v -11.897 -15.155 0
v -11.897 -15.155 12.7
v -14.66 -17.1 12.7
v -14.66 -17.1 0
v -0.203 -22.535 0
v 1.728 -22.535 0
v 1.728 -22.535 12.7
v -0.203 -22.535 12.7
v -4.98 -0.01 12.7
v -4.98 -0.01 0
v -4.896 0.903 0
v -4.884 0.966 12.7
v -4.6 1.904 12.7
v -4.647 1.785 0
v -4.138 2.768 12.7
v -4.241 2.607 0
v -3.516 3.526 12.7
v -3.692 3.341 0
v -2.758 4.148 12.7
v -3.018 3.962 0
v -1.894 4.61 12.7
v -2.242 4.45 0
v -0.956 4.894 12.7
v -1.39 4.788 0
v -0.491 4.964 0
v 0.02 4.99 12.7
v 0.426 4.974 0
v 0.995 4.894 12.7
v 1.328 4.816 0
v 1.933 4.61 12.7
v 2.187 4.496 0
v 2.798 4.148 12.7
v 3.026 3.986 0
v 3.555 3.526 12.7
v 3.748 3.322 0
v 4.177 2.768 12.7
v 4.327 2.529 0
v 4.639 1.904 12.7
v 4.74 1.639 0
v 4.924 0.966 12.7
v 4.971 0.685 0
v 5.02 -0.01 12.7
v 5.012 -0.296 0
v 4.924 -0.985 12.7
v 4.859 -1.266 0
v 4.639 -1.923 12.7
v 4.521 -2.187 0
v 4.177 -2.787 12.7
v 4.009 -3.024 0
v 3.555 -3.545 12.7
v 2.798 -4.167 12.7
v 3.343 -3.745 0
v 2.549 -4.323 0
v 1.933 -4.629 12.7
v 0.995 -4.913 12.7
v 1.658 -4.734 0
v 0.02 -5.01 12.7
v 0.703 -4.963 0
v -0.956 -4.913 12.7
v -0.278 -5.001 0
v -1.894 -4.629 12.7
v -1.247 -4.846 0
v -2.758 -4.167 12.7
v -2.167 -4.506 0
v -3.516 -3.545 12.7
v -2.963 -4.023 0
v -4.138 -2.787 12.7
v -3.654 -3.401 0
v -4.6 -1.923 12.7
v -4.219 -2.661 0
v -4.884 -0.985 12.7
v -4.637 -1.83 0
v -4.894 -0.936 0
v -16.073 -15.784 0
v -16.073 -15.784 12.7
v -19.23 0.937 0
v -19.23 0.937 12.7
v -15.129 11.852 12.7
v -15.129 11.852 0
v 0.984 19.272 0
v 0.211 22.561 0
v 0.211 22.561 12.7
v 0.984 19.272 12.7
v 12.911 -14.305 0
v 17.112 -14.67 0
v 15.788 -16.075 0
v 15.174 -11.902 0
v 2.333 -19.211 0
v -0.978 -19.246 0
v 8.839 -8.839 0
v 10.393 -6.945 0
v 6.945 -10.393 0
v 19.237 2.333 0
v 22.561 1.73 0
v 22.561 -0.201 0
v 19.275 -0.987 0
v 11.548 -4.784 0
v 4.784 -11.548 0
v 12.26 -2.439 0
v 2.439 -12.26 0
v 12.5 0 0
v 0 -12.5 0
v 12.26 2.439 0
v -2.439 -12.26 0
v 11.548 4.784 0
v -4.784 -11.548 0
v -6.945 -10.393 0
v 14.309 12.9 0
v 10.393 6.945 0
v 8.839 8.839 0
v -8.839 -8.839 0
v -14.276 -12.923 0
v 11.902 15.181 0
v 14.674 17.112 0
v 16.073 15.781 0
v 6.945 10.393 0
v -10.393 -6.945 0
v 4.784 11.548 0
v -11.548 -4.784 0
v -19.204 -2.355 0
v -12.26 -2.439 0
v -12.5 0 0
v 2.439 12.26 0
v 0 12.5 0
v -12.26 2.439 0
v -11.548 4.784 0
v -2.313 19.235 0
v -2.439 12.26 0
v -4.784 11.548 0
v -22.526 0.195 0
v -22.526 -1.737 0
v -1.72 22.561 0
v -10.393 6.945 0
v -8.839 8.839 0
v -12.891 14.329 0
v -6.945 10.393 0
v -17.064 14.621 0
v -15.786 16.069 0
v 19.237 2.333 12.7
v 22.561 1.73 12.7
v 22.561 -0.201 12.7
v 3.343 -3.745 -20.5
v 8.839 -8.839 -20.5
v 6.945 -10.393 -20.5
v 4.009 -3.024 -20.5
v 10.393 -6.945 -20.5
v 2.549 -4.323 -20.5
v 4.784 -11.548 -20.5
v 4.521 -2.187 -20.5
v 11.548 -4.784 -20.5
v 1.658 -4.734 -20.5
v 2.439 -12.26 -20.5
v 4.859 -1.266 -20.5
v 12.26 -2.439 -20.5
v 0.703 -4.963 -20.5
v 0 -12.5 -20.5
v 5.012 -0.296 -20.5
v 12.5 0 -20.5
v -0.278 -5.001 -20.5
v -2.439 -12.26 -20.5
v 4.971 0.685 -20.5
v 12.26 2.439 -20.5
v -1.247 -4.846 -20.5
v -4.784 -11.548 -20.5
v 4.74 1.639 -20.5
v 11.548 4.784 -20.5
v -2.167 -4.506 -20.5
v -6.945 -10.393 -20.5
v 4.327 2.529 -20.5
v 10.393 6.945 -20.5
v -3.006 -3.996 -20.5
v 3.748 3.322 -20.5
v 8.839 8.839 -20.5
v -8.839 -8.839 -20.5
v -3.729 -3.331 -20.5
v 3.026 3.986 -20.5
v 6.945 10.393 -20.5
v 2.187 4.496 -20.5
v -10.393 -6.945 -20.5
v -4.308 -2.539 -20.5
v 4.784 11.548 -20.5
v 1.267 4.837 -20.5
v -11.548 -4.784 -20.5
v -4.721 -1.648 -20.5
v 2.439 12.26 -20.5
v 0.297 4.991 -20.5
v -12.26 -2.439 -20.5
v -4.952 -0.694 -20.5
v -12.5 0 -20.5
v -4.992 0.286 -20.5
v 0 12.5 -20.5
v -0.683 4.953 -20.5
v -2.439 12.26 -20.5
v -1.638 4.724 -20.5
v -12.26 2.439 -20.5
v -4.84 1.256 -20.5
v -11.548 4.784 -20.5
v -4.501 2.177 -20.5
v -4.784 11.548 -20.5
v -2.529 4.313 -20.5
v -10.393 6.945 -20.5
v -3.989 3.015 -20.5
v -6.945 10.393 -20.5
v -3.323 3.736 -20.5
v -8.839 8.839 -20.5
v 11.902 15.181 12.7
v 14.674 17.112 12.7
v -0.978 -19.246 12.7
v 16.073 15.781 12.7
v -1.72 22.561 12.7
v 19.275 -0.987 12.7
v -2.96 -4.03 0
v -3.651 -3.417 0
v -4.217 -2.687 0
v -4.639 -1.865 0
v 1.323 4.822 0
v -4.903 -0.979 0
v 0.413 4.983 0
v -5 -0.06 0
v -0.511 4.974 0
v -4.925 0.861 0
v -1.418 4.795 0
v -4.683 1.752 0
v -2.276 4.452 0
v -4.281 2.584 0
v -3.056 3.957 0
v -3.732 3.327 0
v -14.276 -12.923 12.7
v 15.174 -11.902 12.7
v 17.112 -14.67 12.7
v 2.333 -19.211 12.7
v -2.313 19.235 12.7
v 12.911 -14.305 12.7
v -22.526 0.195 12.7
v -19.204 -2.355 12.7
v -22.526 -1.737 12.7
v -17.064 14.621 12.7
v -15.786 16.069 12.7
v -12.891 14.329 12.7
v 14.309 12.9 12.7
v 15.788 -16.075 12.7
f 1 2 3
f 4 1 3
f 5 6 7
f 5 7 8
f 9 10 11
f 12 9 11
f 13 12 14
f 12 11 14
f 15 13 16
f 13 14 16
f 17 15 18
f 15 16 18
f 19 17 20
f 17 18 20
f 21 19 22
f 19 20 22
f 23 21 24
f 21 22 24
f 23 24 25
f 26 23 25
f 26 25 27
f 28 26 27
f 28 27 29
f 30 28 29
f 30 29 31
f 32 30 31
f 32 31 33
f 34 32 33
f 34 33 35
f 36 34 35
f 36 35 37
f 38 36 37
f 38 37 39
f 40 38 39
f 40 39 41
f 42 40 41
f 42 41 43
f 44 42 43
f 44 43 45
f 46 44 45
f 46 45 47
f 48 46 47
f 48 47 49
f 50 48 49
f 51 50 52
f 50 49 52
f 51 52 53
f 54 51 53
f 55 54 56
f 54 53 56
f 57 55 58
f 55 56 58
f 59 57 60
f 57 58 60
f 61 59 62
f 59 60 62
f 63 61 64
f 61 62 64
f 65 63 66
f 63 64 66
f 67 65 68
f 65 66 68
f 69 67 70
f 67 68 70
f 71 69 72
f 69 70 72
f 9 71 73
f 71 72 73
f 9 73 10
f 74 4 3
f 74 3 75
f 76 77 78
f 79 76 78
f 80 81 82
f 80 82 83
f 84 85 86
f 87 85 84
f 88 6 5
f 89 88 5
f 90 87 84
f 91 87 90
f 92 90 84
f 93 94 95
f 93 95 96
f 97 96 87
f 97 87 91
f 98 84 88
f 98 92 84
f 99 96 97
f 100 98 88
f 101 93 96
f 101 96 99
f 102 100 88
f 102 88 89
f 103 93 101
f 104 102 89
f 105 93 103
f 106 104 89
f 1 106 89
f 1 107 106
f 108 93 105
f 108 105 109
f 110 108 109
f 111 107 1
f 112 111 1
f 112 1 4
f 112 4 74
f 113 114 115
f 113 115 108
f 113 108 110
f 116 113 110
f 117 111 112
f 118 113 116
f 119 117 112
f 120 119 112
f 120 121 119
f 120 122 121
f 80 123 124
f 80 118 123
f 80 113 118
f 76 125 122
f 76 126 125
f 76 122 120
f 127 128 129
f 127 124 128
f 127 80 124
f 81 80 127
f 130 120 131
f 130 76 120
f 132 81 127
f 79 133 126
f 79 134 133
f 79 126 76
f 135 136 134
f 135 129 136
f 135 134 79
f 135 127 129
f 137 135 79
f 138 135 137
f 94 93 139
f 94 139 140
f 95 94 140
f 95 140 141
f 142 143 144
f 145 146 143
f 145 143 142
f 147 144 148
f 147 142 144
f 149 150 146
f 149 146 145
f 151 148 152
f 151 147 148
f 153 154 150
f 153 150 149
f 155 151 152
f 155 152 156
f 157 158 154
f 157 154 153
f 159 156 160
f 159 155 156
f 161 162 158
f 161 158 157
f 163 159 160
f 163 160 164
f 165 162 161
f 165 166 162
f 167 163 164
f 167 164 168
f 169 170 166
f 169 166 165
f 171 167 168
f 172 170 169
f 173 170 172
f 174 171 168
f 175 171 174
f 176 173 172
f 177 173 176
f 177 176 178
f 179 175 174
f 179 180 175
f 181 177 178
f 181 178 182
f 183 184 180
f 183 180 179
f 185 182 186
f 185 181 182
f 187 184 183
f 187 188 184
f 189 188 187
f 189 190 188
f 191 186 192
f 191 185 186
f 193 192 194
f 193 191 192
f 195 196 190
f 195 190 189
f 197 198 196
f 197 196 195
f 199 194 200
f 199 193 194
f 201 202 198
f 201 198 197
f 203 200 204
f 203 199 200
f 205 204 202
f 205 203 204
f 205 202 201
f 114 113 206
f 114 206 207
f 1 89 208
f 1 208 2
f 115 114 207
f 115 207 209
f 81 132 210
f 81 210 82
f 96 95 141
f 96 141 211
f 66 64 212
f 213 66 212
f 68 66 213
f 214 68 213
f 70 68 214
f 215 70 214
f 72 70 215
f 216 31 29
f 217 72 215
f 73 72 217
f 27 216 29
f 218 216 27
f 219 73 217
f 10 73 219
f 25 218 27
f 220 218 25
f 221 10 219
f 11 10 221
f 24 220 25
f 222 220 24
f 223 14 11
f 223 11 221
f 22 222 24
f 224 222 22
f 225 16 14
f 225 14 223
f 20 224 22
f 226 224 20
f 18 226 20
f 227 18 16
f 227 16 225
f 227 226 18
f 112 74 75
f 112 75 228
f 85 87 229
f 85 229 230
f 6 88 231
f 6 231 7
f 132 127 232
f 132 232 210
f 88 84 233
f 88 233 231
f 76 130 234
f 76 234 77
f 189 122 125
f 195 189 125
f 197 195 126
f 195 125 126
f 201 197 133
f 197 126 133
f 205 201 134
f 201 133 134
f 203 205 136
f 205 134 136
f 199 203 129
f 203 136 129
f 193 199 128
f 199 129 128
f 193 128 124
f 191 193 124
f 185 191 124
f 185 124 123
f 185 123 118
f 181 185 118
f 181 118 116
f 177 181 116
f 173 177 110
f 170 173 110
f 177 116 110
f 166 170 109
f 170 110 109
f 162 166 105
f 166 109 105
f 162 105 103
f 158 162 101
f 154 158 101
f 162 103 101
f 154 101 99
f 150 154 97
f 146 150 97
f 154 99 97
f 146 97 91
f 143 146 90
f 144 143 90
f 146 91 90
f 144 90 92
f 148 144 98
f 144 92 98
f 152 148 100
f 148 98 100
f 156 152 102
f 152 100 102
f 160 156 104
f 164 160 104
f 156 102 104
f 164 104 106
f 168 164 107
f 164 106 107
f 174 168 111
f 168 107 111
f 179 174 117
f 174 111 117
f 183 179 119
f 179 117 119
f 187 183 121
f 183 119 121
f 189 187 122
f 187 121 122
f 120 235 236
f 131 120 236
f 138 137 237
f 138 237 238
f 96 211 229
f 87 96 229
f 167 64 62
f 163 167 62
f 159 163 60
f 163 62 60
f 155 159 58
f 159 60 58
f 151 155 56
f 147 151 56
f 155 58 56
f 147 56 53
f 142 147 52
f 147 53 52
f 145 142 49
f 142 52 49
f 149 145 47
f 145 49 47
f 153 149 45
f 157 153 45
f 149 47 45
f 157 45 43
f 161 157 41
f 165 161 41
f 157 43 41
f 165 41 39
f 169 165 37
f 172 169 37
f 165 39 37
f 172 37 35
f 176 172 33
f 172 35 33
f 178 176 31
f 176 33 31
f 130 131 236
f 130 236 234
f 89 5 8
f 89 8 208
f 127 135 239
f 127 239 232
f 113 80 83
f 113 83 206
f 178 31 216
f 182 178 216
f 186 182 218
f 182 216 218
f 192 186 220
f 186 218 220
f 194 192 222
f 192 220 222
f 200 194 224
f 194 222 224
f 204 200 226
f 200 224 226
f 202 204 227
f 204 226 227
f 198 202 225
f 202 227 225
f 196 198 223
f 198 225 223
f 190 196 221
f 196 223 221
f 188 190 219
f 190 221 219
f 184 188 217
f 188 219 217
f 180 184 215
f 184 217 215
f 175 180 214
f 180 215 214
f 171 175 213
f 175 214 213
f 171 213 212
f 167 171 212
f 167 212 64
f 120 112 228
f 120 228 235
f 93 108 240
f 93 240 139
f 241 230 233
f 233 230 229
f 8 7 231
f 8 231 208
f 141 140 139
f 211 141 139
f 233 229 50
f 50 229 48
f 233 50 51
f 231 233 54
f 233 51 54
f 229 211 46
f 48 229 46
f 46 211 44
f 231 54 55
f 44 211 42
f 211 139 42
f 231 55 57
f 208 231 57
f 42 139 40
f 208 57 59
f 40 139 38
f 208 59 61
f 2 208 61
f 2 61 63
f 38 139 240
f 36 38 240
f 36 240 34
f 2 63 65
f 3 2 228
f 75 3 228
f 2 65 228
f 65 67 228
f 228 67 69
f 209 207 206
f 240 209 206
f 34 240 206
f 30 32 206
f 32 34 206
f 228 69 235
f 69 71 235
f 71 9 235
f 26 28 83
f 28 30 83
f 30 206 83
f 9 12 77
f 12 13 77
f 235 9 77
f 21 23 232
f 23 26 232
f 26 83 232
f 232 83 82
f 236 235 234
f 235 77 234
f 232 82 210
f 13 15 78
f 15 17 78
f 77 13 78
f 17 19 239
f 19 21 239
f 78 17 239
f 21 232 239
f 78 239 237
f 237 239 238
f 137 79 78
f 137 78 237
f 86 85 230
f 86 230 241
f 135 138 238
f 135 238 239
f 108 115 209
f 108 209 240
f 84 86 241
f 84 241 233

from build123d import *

# Parameters (mm, degrees)
BOSS_EXTRUDE1_DEPTH     = 12.7
CUT_EXTRUDE1_REACH      = 36.341
SKETCH2_R               = 5
BOSS_EXTRUDE3_OUTLINE_R = 12.5
BOSS_EXTRUDE3_DEPTH     = 20.5


# Read off the part's stored shape, not the designer's step: Boss-Extrude3
with BuildPart() as part:
    # Sketch1 → Boss-Extrude1 (new body)
    with BuildSketch(Plane(origin=(0, 0, 0), x_dir=(-1, 0, 0), z_dir=(0, 0, -1))):
        Polygon((22.52557458, -1.736588639), (22.52557458, 0.194536921), (19.229808022, 0.93665661), (15.128723263, 11.851737372), (17.063649078, 14.621011813), (15.786423571, 16.069438867), (12.890863827, 14.329165151), (2.313040546, 19.235032954), (1.719665356, 22.560799741), (-0.211460204, 22.560799741), (-0.98374926, 19.271971918), (-11.902473648, 15.180597821), (-14.673902719, 17.112436257), (-16.073066924, 15.781427071), (-14.308800518, 12.900423272), (-19.236913758, 2.332945609), (-22.560976284, 1.730096406), (-22.560976284, -0.201029153), (-19.275488766, -0.987407309), (-15.174404006, -11.902488071), (-17.112216048, -14.669743631), (-15.788139908, -16.075470597), (-12.910837913, -14.305173427), (-2.333014633, -19.21104123), (-1.727718406, -22.534659035), (0.203407153, -22.534659035), (0.978499423, -19.246490729), (11.89722381, -15.155116632), (14.659649692, -17.099807376), (16.072878525, -15.783741196), (14.276312796, -12.922767512), (19.204426036, -2.355289849), align=None)
    extrude(amount=-BOSS_EXTRUDE1_DEPTH)

    # Sketch2 → Cut-Extrude1 (cut, up to next)
    with BuildSketch(Plane(origin=(0, 0, 0), x_dir=(-1, 0, 0), z_dir=(0, 0, -1)), mode=Mode.PRIVATE) as cut_extrude1_sk1:
        with Locations((-0.019773646, -0.00956531)):
            Circle(SKETCH2_R)
    cut_extrude1_tool1 = extrude(cut_extrude1_sk1.sketch, amount=-CUT_EXTRUDE1_REACH, mode=Mode.PRIVATE) & part.part
    add(cut_extrude1_tool1.solids().sort_by_distance((0.019774, -0.009565, 0))[0], mode=Mode.SUBTRACT)

    # Boss-Extrude3 outline → Boss-Extrude3 (add)
    with BuildSketch(Plane(origin=(0, 0, 0), x_dir=(-1, 0, 0), z_dir=(0, 0, -1))):
        Circle(BOSS_EXTRUDE3_OUTLINE_R)
        with BuildLine():
            ThreePointArc((2.167436153, -4.505798544), (-4.520800394, -2.186893539), (-2.187209799, 4.496233234))
            ThreePointArc((-2.187209799, 4.496233234), (4.501026748, 2.177328229), (2.167436153, -4.505798544))
        make_face(mode=Mode.SUBTRACT)
    extrude(amount=BOSS_EXTRUDE3_DEPTH)


solid = part.part
